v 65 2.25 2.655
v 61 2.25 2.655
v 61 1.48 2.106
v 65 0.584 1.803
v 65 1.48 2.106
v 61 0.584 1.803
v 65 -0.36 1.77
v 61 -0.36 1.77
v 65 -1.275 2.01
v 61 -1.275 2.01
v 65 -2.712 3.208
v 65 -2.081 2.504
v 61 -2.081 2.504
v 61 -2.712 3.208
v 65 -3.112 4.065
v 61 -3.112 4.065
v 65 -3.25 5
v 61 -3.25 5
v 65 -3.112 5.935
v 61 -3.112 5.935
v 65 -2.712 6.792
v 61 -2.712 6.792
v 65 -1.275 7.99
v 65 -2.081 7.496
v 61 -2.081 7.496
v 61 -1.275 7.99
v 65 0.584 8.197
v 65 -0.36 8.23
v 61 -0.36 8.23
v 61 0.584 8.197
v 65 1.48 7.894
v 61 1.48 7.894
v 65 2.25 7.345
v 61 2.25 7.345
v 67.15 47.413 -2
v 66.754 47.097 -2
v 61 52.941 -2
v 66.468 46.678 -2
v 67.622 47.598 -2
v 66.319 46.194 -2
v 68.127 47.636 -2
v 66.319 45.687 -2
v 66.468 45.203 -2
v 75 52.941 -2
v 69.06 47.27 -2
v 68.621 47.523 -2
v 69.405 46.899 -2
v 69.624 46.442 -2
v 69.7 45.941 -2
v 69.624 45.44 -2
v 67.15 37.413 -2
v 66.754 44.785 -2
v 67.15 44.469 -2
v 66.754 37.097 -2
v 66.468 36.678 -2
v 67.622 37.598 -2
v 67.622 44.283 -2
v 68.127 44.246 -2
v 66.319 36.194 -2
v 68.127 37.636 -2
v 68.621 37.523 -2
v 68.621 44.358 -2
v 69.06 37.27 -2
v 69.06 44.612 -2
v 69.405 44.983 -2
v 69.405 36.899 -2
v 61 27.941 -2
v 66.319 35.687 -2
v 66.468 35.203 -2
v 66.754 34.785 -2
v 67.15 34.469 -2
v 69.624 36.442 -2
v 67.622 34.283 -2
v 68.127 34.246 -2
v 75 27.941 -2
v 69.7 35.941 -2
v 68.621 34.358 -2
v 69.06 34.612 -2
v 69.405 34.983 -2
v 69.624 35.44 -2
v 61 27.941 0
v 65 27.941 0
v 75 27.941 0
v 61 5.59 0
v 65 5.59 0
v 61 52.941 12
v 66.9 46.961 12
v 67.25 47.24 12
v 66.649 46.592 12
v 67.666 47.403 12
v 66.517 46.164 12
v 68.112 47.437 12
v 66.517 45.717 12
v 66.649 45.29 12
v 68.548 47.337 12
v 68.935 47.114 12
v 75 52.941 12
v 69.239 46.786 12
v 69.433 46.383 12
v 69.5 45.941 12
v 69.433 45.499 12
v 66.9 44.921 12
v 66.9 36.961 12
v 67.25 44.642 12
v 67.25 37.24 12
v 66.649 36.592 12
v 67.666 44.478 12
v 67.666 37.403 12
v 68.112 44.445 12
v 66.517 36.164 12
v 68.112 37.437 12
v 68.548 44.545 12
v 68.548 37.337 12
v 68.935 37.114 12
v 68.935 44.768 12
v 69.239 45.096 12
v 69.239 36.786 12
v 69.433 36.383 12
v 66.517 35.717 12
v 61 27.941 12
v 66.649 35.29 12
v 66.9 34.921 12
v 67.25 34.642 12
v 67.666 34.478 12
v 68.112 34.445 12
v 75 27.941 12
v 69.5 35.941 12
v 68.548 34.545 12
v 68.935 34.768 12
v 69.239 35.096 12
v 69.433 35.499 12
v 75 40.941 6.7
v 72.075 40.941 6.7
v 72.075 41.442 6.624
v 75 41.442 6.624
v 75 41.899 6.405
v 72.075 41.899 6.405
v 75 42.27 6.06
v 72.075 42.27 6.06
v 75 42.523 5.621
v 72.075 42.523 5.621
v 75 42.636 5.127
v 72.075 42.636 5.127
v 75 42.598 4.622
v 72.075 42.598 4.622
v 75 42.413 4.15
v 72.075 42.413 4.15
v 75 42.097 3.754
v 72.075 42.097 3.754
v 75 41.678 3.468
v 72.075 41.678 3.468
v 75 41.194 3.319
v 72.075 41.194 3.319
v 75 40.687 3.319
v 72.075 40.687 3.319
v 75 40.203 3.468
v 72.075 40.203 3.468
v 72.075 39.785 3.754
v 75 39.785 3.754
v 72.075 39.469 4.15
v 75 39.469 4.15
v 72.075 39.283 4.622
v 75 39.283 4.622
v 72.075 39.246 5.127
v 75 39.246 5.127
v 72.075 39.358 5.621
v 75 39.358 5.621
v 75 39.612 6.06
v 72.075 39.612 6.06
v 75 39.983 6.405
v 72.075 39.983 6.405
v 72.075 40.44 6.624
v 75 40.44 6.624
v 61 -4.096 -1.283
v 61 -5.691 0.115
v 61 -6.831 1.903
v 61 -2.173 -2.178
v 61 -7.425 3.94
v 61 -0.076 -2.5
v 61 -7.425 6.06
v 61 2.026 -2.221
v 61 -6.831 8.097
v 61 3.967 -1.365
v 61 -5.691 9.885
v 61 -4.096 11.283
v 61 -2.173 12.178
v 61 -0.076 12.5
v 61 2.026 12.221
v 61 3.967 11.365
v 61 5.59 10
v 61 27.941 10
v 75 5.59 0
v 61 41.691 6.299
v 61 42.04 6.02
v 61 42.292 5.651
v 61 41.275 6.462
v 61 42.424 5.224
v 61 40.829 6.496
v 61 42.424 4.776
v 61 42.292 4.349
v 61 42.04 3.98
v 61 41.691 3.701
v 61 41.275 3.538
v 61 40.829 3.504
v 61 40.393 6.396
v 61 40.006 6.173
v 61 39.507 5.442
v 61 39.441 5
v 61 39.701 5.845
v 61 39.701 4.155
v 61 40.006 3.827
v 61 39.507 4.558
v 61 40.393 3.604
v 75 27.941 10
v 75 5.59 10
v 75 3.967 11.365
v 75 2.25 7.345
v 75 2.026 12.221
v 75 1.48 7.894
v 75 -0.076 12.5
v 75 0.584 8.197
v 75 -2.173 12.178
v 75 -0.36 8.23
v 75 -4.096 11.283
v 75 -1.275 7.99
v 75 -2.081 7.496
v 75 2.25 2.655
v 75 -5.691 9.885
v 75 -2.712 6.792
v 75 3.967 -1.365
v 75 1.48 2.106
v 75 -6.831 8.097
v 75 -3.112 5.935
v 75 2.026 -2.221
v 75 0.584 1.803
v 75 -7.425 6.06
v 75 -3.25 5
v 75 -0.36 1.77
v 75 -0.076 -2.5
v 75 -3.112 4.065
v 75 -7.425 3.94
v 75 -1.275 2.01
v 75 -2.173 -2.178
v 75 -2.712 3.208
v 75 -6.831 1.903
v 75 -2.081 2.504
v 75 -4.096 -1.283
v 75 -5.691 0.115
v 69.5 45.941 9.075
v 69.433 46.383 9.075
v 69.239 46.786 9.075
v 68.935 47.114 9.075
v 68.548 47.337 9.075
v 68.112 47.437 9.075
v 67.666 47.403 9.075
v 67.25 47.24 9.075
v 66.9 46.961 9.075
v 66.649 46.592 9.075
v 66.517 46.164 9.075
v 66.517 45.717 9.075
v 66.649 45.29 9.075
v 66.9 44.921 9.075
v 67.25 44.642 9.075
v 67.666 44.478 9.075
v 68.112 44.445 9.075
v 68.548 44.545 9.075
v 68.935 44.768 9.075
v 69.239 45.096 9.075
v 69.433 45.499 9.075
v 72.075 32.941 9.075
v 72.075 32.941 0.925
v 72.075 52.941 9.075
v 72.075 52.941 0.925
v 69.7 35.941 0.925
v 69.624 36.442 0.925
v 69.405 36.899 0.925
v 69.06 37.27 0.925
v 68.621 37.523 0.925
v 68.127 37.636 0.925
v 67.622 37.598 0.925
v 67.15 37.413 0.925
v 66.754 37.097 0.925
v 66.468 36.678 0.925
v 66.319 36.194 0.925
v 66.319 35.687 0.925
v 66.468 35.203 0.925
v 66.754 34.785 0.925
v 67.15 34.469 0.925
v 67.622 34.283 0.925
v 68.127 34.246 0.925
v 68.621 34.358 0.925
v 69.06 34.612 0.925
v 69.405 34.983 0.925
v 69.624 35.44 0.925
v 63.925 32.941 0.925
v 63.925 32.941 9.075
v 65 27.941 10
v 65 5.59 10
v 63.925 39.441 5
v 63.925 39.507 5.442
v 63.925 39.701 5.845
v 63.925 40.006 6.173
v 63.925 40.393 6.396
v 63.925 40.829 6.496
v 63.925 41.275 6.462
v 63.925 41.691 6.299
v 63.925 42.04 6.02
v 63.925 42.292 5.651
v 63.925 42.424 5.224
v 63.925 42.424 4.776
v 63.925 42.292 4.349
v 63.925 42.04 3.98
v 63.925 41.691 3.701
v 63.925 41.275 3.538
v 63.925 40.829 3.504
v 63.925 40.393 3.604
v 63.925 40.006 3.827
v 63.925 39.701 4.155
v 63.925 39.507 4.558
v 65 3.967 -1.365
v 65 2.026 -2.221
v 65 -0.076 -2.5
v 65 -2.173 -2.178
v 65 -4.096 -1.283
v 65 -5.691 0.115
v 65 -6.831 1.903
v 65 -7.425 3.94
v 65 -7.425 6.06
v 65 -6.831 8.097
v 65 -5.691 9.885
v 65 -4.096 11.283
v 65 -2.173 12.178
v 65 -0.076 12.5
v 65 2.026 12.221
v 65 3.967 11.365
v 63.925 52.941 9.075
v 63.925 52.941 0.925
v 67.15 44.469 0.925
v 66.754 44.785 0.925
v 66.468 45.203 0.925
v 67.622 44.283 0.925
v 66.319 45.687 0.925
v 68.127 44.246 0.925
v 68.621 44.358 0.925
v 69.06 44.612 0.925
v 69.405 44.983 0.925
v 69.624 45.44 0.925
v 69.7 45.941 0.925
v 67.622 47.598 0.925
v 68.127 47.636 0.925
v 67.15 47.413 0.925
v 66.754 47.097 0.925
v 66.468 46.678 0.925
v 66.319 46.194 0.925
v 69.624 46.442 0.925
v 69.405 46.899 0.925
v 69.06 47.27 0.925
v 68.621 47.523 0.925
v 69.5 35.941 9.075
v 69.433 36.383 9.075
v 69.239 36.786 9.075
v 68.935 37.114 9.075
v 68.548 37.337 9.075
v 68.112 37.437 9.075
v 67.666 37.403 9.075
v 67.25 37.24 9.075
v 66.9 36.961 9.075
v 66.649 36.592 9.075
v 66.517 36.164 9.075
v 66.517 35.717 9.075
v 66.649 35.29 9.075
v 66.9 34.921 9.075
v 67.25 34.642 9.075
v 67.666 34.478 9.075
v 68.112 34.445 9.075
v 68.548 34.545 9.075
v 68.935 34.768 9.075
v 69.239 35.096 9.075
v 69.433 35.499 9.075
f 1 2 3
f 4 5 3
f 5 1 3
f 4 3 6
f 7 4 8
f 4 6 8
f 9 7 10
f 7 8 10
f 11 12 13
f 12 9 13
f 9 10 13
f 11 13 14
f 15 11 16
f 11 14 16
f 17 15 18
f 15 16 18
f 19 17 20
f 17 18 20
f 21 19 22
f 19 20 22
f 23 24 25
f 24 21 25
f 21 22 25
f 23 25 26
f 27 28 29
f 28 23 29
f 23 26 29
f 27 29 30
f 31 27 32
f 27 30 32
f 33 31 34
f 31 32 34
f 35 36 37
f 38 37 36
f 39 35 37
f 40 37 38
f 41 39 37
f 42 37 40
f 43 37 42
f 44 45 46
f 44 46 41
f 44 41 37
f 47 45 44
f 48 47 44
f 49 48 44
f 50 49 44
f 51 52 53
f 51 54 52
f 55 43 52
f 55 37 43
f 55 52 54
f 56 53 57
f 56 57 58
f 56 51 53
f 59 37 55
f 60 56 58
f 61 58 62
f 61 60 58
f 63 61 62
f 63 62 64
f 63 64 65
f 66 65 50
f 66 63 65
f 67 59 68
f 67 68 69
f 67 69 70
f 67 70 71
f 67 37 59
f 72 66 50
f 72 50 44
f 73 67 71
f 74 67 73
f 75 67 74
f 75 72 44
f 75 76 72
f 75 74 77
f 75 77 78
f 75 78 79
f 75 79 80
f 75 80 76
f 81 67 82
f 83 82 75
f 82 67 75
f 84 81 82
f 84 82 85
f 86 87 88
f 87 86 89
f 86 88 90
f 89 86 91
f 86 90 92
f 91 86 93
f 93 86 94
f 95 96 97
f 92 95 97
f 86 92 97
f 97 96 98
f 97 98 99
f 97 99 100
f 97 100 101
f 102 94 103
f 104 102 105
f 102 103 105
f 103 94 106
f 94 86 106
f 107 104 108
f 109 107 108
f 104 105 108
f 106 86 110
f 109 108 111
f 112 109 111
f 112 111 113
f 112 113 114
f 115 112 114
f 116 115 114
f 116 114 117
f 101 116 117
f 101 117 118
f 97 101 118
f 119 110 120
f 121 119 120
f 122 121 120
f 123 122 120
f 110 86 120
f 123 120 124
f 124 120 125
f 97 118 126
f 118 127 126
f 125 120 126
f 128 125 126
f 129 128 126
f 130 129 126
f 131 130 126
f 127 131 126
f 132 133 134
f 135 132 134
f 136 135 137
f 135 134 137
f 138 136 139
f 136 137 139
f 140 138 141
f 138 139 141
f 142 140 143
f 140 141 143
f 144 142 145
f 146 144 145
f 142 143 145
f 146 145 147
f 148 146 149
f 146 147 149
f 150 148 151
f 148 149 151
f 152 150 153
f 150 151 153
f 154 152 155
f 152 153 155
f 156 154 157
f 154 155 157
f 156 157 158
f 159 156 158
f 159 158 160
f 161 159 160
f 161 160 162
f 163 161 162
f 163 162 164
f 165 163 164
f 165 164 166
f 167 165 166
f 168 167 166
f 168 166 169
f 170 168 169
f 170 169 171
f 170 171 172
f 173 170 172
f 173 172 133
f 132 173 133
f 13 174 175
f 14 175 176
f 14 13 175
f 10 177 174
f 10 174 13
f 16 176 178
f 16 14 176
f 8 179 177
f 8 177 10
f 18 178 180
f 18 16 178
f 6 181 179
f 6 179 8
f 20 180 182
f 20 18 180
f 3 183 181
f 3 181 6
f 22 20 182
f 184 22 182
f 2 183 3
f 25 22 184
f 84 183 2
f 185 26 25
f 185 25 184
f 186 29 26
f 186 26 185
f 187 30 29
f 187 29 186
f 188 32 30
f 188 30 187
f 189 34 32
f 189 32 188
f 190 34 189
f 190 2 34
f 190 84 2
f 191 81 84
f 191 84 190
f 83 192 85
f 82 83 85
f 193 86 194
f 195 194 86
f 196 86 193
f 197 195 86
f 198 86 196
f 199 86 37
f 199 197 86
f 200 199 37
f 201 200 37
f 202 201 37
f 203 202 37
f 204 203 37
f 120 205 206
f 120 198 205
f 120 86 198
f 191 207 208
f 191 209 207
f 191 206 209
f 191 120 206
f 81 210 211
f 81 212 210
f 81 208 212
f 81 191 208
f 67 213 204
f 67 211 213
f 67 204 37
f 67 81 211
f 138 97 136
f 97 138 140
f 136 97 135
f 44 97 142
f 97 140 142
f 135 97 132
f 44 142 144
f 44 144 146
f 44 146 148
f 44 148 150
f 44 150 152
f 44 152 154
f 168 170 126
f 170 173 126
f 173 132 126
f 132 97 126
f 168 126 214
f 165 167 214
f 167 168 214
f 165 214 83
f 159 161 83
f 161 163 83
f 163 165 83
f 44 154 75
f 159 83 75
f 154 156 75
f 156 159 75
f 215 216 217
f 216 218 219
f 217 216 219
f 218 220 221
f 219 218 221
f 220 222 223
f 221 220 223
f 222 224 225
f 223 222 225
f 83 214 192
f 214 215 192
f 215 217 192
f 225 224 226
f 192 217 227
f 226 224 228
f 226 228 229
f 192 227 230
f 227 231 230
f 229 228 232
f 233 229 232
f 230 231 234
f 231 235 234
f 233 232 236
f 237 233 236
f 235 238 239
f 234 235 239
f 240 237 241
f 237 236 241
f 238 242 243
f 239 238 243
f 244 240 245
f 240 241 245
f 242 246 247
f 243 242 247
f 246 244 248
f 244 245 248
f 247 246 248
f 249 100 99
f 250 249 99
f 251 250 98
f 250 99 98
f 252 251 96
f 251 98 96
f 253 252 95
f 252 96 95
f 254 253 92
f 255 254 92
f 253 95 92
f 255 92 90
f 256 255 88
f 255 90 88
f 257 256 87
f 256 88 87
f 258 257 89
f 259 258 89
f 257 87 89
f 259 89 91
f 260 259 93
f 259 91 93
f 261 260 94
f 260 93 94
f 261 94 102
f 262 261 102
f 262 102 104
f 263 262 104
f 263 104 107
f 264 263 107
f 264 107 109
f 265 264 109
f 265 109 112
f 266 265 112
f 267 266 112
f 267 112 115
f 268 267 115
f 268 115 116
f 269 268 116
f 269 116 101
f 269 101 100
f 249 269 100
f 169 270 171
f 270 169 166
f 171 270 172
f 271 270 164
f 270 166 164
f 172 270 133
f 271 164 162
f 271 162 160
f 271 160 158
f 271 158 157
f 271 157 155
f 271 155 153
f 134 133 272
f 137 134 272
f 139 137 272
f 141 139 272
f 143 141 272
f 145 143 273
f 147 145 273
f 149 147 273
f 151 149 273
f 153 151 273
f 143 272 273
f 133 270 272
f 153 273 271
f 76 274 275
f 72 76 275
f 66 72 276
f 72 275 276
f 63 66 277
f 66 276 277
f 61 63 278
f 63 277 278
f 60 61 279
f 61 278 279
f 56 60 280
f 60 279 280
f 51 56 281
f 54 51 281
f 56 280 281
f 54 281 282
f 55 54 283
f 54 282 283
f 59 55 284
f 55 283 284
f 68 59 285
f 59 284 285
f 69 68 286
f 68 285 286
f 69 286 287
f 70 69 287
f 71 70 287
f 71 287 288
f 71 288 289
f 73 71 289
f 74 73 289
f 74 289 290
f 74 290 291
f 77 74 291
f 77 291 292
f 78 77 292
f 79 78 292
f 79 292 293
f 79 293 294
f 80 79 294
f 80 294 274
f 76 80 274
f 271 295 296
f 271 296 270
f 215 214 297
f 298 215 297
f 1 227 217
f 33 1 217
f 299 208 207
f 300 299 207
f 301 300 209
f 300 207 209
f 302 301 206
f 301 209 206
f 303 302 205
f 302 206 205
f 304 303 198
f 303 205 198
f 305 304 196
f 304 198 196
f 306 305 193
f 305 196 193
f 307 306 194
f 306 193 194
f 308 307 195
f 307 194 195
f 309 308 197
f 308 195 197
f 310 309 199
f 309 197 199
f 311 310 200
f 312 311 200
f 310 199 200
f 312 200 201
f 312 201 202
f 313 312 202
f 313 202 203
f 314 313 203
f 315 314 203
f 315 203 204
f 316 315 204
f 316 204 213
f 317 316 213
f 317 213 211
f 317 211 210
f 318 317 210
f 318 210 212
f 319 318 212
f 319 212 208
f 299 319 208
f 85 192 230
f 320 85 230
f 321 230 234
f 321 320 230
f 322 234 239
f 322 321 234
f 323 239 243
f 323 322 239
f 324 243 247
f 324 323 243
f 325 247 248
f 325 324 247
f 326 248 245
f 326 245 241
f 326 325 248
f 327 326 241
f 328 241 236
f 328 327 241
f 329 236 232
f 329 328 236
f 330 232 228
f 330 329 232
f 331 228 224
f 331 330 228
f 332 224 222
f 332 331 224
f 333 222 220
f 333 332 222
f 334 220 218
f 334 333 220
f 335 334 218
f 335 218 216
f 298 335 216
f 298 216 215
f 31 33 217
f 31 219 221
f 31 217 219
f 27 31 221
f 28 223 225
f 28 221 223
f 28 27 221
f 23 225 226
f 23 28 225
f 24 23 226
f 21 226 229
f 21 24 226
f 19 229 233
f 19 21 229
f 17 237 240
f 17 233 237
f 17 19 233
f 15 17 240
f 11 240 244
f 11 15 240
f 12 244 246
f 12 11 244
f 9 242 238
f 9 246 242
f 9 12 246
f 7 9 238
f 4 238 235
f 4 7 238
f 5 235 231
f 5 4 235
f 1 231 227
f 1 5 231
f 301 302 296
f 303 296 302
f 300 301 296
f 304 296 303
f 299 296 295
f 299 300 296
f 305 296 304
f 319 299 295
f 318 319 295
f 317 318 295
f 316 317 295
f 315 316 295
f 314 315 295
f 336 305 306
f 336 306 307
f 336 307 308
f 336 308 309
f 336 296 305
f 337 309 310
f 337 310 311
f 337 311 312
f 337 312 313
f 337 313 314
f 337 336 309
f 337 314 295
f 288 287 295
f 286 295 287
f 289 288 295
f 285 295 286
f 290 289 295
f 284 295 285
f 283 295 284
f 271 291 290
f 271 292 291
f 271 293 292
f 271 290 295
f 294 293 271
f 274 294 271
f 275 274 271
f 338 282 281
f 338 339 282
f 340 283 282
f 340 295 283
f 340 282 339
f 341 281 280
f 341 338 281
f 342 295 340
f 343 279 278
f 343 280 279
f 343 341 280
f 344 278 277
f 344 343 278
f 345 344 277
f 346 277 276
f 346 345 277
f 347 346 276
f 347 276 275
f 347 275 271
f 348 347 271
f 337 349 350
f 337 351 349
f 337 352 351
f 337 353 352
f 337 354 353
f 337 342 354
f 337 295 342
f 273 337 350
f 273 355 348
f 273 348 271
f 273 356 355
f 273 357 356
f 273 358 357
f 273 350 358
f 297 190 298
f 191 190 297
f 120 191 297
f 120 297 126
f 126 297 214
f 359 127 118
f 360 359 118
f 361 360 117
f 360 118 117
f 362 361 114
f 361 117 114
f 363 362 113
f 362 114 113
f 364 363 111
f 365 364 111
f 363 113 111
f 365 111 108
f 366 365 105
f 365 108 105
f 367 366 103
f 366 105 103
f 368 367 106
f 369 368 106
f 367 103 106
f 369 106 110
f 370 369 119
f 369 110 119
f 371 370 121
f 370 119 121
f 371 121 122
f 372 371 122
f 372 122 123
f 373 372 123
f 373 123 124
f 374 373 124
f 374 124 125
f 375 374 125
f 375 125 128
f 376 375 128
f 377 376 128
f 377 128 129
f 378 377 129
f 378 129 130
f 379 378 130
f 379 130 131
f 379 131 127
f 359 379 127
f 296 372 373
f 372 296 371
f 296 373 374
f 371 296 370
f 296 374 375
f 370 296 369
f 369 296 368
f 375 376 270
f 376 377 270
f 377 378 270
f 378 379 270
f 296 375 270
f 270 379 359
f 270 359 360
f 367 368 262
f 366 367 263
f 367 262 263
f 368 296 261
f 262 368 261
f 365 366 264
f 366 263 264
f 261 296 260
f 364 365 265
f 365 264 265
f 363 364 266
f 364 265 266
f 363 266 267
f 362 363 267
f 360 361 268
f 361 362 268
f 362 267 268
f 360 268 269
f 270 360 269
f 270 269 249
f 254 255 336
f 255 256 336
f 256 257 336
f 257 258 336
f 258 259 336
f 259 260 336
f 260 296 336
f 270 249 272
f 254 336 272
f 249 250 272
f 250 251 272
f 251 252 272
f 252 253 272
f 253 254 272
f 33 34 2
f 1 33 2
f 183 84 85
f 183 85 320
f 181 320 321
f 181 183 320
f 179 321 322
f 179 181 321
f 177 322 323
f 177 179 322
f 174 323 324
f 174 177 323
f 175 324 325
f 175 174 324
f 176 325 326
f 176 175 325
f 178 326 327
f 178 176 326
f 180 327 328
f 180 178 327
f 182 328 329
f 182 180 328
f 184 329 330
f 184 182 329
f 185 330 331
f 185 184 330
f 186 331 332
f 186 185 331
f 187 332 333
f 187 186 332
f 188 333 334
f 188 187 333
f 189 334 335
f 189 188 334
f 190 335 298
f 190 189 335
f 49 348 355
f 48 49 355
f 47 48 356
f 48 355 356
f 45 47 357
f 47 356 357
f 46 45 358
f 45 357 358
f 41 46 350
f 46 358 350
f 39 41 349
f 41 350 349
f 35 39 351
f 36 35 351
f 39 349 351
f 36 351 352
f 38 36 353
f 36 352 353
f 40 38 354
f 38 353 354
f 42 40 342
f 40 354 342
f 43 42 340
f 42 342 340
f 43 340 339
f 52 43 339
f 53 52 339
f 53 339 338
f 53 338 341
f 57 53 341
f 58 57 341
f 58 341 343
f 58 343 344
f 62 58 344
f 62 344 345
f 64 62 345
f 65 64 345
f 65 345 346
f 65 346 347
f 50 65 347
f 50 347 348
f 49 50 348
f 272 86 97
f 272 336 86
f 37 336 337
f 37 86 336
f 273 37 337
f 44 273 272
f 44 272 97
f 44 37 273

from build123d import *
from build123d.topology import SkipClean

# Parameters (mm, degrees)
BOSS_EXTRU_1_DEPTH      = 10
BOSS_EXTRU_2_DEPTH      = 15
CONG_1_R                = 20
CONG_2_R                = 4
ESQUISSE3_R             = 7.5
BOSS_EXTRU_3_DEPTH      = 10
ENL_V_MAT_EXTRU_1_DEPTH = 25
ESQUISSE11_W            = 14
ESQUISSE11_H            = 14
BOSS_EXTRU_4_DEPTH      = 25
ESQUISSE12_W            = 8.15
ESQUISSE12_H            = 8.15
ENL_V_MAT_EXTRU_4_DEPTH = 20
ENL_V_MAT_EXTRU_5_REACH = 58.169
ESQUISSE13_R            = 1.5
ENL_V_MAT_EXTRU_2_DEPTH = 20
ENL_V_MAT_EXTRU_6_REACH = 94.941
ESQUISSE15_R            = 1.5
D_GAGEMENT_M31_D        = 3.4
D_GAGEMENT_M31_DEPTH    = 10
D_GAGEMENT_M31_TIP      = 1.021463052
D_GAGEMENT_M32_D        = 3.4
D_GAGEMENT_M32_DEPTH    = 10
D_GAGEMENT_M32_TIP      = 1.021463052
BOSS_EXTRU_6_START      = 4
BOSS_EXTRU_6_DEPTH      = 4


with BuildPart() as part:
    # Esquisse1 → Boss.-Extru.1 (new body)
    with BuildSketch(Plane.XY):
        Polygon((65, 0), (65, 121.945008565), (0, 145.603073792), (3.420201433, 155), (70, 130.766935118), (136.579798567, 155), (140, 145.603073792), (75, 121.945008565), (75, 0), align=None)
    extrude(amount=BOSS_EXTRU_1_DEPTH)

    # Esquisse2 → Boss.-Extru.2 (add)
    with BuildSketch(Plane(origin=(0, 0, 0), x_dir=(-1, 0, 0), z_dir=(0, 0, -1))):
        Polygon((-135.301536896, 143.892973076), (-140, 145.603073792), (-136.579798567, 155), (-127.182872359, 151.579798567), (-128.892973076, 146.881335463), align=None)
        Polygon((0, 145.603073792), (-4.698463104, 143.892973076), (-11.107026924, 146.881335463), (-12.817127641, 151.579798567), (-3.420201433, 155), align=None)
    extrude(amount=BOSS_EXTRU_2_DEPTH)

    # Congé1
    cong_1_edges = [part.edges().sort_by_distance(p)[0] for p in [
        (65, 121.945008565, 5),
        (70, 130.766935118, 5),
        (75, 121.945008565, 5),
    ]]
    fillet(cong_1_edges, radius=CONG_1_R)

    # Congé2
    cong_2_edges = [part.edges().sort_by_distance(p)[0] for p in [
        (138.289899283, 150.301536896, 10),
        (1.710100717, 150.301536896, 10),
    ]]
    fillet(cong_2_edges, radius=CONG_2_R)

    # Esquisse3 → Boss.-Extru.3 (add)
    with BuildSketch(Plane.ZY.offset(-65)):
        with Locations((5, 0)):
            Circle(ESQUISSE3_R)
    extrude(amount=-BOSS_EXTRU_3_DEPTH)

    # Esquisse7 → Enlèv. mat.-Extru.1 (cut)
    with BuildSketch(Plane.XY.offset(10)):
        with BuildLine():
            Line((3.420201433, 155), (0, 145.603073792))
            Line((0, 145.603073792), (51.840402867, 126.734710216))
            ThreePointArc((51.840402867, 126.734710216), (61.383040886, 119.412386528), (65, 107.940857801))
            Line((65, 107.940857801), (65, 27.940857801))
            Line((65, 27.940857801), (75, 27.940857801))
            Line((75, 27.940857801), (75, 107.940857801))
            ThreePointArc((75, 107.940857801), (78.616959114, 119.412386528), (88.159597133, 126.734710216))
            Line((88.159597133, 126.734710216), (140, 145.603073792))
            Line((140, 145.603073792), (136.579798567, 155))
            Line((136.579798567, 155), (76.840402867, 133.256638152))
            ThreePointArc((76.840402867, 133.256638152), (70, 132.050490568), (63.159597133, 133.256638152))
            Line((63.159597133, 133.256638152), (3.420201433, 155))
        make_face()
    extrude(amount=-ENL_V_MAT_EXTRU_1_DEPTH, mode=Mode.SUBTRACT)

    # Esquisse11 → Boss.-Extru.4 (add)
    with BuildSketch(Plane(origin=(0, 27.940857801, 0), x_dir=(1, 0, 0), z_dir=(0, 1, 0))):
        with Locations((68, -5)):
            Rectangle(ESQUISSE11_W, ESQUISSE11_H)
    extrude(amount=BOSS_EXTRU_4_DEPTH)

    # Esquisse12 → Enlèv. mat.-Extru.4 (cut)
    with BuildSketch(Plane(origin=(0, 52.940857801, 0), x_dir=(1, 0, 0), z_dir=(0, 1, 0))):
        with Locations((68, -5)):
            Rectangle(ESQUISSE12_W, ESQUISSE12_H)
    extrude(amount=-ENL_V_MAT_EXTRU_4_DEPTH, mode=Mode.SUBTRACT)

    # Enlèv. mat.-Extru.5: up to this face of the body (flat: up to its plane)
    enl_v_mat_extru_5_end = Plane(part.part.faces().sort_by_distance((75, 24.172523414, 5))[0])
    # Esquisse13 → Enlèv. mat.-Extru.5 (cut, up to the picked face)
    with BuildSketch(Plane.ZY.offset(-61), mode=Mode.PRIVATE) as enl_v_mat_extru_5_sk1:
        with Locations(Location((5, 40.940857801, 0), (0, 0, 270))):
            Circle(ESQUISSE13_R)
    enl_v_mat_extru_5_tool1 = split(extrude(enl_v_mat_extru_5_sk1.sketch, amount=-ENL_V_MAT_EXTRU_5_REACH, mode=Mode.PRIVATE), bisect_by=enl_v_mat_extru_5_end, keep=Keep.BOTH, mode=Mode.PRIVATE)
    add(enl_v_mat_extru_5_tool1.solids().sort_by(Axis((61, 40.940858, 5), (1, 0, 0)))[0], mode=Mode.SUBTRACT)

    # Esquisse4 → Enlèv. mat.-Extru.2 (cut)
    with BuildSketch(Plane.ZY.offset(-65)):
        with BuildLine():
            Line((2.65479212, 2.25), (7.34520788, 2.25))
            ThreePointArc((7.34520788, 2.25), (5, -3.25), (2.65479212, 2.25))
        make_face()
    extrude(amount=-ENL_V_MAT_EXTRU_2_DEPTH, mode=Mode.SUBTRACT)

    # Enlèv. mat.-Extru.6: up to this face of the body (flat: up to its plane)
    enl_v_mat_extru_6_end = Plane(part.part.faces().sort_by_distance((68, 40.440857801, -2))[0])
    # Esquisse15 → Enlèv. mat.-Extru.6 (cut, up to the picked face)
    with BuildSketch(Plane.XY.offset(12), mode=Mode.PRIVATE) as enl_v_mat_extru_6_sk1:
        with Locations((68, 45.940857801)):
            Circle(ESQUISSE15_R)
    enl_v_mat_extru_6_tool1 = split(extrude(enl_v_mat_extru_6_sk1.sketch, amount=-ENL_V_MAT_EXTRU_6_REACH, mode=Mode.PRIVATE), bisect_by=enl_v_mat_extru_6_end, keep=Keep.BOTH, mode=Mode.PRIVATE)
    # Esquisse15 → Enlèv. mat.-Extru.6 (cut, up to the picked face)
    with BuildSketch(Plane.XY.offset(12), mode=Mode.PRIVATE) as enl_v_mat_extru_6_sk2:
        with Locations((68, 35.940857801)):
            Circle(ESQUISSE15_R)
    enl_v_mat_extru_6_tool2 = split(extrude(enl_v_mat_extru_6_sk2.sketch, amount=-ENL_V_MAT_EXTRU_6_REACH, mode=Mode.PRIVATE), bisect_by=enl_v_mat_extru_6_end, keep=Keep.BOTH, mode=Mode.PRIVATE)
    add(enl_v_mat_extru_6_tool1.solids().sort_by(Axis((68, 45.940858, 12), (0, 0, -1)))[0], mode=Mode.SUBTRACT)
    add(enl_v_mat_extru_6_tool2.solids().sort_by(Axis((68, 35.940858, 12), (0, 0, -1)))[0], mode=Mode.SUBTRACT)

    # Dégagement M31
    with Locations(Plane(origin=(0, 0, -2), x_dir=(-1, 0, 0), z_dir=(0, 0, -1))):
        with Locations((-68, 45.940857801), (-68, 35.940857801)):
            Hole(D_GAGEMENT_M31_D / 2, depth=D_GAGEMENT_M31_DEPTH)
            with Locations((0, 0, -(D_GAGEMENT_M31_DEPTH + D_GAGEMENT_M31_TIP / 2))):  # 118° drill point
                Cone(0, D_GAGEMENT_M31_D / 2, D_GAGEMENT_M31_TIP, mode=Mode.SUBTRACT)

    # Dégagement M32
    with Locations(Plane(origin=(75, 0, 0), x_dir=(0, 0, -1), z_dir=(1, 0, 0))):
        with Locations((-5, 40.940857801)):
            Hole(D_GAGEMENT_M32_D / 2, depth=D_GAGEMENT_M32_DEPTH)
            with Locations((0, 0, -(D_GAGEMENT_M32_DEPTH + D_GAGEMENT_M32_TIP / 2))):  # 118° drill point
                Cone(0, D_GAGEMENT_M32_D / 2, D_GAGEMENT_M32_TIP, mode=Mode.SUBTRACT)

    # Esquisse20 → Boss.-Extru.6 (add)
    with SkipClean():  # the faces are left unmerged after this step: merging them gives an invalid solid
        with BuildSketch(Plane.ZY.offset(-65).offset(BOSS_EXTRU_6_START)):
            with BuildLine():
                Line((10, 5.590169944), (10, 27.940857801))
                Line((10, 27.940857801), (0, 27.940857801))
                Line((0, 27.940857801), (0, 5.590169944))
                ThreePointArc((0, 5.590169944), (5, -7.5), (10, 5.590169944))
            make_face()
            with BuildLine():
                Line((7.34520788, 2.25), (2.65479212, 2.25))
                ThreePointArc((2.65479212, 2.25), (5, -3.25), (7.34520788, 2.25))
            make_face(mode=Mode.SUBTRACT)
        extrude(amount=-BOSS_EXTRU_6_DEPTH)


solid = part.part
